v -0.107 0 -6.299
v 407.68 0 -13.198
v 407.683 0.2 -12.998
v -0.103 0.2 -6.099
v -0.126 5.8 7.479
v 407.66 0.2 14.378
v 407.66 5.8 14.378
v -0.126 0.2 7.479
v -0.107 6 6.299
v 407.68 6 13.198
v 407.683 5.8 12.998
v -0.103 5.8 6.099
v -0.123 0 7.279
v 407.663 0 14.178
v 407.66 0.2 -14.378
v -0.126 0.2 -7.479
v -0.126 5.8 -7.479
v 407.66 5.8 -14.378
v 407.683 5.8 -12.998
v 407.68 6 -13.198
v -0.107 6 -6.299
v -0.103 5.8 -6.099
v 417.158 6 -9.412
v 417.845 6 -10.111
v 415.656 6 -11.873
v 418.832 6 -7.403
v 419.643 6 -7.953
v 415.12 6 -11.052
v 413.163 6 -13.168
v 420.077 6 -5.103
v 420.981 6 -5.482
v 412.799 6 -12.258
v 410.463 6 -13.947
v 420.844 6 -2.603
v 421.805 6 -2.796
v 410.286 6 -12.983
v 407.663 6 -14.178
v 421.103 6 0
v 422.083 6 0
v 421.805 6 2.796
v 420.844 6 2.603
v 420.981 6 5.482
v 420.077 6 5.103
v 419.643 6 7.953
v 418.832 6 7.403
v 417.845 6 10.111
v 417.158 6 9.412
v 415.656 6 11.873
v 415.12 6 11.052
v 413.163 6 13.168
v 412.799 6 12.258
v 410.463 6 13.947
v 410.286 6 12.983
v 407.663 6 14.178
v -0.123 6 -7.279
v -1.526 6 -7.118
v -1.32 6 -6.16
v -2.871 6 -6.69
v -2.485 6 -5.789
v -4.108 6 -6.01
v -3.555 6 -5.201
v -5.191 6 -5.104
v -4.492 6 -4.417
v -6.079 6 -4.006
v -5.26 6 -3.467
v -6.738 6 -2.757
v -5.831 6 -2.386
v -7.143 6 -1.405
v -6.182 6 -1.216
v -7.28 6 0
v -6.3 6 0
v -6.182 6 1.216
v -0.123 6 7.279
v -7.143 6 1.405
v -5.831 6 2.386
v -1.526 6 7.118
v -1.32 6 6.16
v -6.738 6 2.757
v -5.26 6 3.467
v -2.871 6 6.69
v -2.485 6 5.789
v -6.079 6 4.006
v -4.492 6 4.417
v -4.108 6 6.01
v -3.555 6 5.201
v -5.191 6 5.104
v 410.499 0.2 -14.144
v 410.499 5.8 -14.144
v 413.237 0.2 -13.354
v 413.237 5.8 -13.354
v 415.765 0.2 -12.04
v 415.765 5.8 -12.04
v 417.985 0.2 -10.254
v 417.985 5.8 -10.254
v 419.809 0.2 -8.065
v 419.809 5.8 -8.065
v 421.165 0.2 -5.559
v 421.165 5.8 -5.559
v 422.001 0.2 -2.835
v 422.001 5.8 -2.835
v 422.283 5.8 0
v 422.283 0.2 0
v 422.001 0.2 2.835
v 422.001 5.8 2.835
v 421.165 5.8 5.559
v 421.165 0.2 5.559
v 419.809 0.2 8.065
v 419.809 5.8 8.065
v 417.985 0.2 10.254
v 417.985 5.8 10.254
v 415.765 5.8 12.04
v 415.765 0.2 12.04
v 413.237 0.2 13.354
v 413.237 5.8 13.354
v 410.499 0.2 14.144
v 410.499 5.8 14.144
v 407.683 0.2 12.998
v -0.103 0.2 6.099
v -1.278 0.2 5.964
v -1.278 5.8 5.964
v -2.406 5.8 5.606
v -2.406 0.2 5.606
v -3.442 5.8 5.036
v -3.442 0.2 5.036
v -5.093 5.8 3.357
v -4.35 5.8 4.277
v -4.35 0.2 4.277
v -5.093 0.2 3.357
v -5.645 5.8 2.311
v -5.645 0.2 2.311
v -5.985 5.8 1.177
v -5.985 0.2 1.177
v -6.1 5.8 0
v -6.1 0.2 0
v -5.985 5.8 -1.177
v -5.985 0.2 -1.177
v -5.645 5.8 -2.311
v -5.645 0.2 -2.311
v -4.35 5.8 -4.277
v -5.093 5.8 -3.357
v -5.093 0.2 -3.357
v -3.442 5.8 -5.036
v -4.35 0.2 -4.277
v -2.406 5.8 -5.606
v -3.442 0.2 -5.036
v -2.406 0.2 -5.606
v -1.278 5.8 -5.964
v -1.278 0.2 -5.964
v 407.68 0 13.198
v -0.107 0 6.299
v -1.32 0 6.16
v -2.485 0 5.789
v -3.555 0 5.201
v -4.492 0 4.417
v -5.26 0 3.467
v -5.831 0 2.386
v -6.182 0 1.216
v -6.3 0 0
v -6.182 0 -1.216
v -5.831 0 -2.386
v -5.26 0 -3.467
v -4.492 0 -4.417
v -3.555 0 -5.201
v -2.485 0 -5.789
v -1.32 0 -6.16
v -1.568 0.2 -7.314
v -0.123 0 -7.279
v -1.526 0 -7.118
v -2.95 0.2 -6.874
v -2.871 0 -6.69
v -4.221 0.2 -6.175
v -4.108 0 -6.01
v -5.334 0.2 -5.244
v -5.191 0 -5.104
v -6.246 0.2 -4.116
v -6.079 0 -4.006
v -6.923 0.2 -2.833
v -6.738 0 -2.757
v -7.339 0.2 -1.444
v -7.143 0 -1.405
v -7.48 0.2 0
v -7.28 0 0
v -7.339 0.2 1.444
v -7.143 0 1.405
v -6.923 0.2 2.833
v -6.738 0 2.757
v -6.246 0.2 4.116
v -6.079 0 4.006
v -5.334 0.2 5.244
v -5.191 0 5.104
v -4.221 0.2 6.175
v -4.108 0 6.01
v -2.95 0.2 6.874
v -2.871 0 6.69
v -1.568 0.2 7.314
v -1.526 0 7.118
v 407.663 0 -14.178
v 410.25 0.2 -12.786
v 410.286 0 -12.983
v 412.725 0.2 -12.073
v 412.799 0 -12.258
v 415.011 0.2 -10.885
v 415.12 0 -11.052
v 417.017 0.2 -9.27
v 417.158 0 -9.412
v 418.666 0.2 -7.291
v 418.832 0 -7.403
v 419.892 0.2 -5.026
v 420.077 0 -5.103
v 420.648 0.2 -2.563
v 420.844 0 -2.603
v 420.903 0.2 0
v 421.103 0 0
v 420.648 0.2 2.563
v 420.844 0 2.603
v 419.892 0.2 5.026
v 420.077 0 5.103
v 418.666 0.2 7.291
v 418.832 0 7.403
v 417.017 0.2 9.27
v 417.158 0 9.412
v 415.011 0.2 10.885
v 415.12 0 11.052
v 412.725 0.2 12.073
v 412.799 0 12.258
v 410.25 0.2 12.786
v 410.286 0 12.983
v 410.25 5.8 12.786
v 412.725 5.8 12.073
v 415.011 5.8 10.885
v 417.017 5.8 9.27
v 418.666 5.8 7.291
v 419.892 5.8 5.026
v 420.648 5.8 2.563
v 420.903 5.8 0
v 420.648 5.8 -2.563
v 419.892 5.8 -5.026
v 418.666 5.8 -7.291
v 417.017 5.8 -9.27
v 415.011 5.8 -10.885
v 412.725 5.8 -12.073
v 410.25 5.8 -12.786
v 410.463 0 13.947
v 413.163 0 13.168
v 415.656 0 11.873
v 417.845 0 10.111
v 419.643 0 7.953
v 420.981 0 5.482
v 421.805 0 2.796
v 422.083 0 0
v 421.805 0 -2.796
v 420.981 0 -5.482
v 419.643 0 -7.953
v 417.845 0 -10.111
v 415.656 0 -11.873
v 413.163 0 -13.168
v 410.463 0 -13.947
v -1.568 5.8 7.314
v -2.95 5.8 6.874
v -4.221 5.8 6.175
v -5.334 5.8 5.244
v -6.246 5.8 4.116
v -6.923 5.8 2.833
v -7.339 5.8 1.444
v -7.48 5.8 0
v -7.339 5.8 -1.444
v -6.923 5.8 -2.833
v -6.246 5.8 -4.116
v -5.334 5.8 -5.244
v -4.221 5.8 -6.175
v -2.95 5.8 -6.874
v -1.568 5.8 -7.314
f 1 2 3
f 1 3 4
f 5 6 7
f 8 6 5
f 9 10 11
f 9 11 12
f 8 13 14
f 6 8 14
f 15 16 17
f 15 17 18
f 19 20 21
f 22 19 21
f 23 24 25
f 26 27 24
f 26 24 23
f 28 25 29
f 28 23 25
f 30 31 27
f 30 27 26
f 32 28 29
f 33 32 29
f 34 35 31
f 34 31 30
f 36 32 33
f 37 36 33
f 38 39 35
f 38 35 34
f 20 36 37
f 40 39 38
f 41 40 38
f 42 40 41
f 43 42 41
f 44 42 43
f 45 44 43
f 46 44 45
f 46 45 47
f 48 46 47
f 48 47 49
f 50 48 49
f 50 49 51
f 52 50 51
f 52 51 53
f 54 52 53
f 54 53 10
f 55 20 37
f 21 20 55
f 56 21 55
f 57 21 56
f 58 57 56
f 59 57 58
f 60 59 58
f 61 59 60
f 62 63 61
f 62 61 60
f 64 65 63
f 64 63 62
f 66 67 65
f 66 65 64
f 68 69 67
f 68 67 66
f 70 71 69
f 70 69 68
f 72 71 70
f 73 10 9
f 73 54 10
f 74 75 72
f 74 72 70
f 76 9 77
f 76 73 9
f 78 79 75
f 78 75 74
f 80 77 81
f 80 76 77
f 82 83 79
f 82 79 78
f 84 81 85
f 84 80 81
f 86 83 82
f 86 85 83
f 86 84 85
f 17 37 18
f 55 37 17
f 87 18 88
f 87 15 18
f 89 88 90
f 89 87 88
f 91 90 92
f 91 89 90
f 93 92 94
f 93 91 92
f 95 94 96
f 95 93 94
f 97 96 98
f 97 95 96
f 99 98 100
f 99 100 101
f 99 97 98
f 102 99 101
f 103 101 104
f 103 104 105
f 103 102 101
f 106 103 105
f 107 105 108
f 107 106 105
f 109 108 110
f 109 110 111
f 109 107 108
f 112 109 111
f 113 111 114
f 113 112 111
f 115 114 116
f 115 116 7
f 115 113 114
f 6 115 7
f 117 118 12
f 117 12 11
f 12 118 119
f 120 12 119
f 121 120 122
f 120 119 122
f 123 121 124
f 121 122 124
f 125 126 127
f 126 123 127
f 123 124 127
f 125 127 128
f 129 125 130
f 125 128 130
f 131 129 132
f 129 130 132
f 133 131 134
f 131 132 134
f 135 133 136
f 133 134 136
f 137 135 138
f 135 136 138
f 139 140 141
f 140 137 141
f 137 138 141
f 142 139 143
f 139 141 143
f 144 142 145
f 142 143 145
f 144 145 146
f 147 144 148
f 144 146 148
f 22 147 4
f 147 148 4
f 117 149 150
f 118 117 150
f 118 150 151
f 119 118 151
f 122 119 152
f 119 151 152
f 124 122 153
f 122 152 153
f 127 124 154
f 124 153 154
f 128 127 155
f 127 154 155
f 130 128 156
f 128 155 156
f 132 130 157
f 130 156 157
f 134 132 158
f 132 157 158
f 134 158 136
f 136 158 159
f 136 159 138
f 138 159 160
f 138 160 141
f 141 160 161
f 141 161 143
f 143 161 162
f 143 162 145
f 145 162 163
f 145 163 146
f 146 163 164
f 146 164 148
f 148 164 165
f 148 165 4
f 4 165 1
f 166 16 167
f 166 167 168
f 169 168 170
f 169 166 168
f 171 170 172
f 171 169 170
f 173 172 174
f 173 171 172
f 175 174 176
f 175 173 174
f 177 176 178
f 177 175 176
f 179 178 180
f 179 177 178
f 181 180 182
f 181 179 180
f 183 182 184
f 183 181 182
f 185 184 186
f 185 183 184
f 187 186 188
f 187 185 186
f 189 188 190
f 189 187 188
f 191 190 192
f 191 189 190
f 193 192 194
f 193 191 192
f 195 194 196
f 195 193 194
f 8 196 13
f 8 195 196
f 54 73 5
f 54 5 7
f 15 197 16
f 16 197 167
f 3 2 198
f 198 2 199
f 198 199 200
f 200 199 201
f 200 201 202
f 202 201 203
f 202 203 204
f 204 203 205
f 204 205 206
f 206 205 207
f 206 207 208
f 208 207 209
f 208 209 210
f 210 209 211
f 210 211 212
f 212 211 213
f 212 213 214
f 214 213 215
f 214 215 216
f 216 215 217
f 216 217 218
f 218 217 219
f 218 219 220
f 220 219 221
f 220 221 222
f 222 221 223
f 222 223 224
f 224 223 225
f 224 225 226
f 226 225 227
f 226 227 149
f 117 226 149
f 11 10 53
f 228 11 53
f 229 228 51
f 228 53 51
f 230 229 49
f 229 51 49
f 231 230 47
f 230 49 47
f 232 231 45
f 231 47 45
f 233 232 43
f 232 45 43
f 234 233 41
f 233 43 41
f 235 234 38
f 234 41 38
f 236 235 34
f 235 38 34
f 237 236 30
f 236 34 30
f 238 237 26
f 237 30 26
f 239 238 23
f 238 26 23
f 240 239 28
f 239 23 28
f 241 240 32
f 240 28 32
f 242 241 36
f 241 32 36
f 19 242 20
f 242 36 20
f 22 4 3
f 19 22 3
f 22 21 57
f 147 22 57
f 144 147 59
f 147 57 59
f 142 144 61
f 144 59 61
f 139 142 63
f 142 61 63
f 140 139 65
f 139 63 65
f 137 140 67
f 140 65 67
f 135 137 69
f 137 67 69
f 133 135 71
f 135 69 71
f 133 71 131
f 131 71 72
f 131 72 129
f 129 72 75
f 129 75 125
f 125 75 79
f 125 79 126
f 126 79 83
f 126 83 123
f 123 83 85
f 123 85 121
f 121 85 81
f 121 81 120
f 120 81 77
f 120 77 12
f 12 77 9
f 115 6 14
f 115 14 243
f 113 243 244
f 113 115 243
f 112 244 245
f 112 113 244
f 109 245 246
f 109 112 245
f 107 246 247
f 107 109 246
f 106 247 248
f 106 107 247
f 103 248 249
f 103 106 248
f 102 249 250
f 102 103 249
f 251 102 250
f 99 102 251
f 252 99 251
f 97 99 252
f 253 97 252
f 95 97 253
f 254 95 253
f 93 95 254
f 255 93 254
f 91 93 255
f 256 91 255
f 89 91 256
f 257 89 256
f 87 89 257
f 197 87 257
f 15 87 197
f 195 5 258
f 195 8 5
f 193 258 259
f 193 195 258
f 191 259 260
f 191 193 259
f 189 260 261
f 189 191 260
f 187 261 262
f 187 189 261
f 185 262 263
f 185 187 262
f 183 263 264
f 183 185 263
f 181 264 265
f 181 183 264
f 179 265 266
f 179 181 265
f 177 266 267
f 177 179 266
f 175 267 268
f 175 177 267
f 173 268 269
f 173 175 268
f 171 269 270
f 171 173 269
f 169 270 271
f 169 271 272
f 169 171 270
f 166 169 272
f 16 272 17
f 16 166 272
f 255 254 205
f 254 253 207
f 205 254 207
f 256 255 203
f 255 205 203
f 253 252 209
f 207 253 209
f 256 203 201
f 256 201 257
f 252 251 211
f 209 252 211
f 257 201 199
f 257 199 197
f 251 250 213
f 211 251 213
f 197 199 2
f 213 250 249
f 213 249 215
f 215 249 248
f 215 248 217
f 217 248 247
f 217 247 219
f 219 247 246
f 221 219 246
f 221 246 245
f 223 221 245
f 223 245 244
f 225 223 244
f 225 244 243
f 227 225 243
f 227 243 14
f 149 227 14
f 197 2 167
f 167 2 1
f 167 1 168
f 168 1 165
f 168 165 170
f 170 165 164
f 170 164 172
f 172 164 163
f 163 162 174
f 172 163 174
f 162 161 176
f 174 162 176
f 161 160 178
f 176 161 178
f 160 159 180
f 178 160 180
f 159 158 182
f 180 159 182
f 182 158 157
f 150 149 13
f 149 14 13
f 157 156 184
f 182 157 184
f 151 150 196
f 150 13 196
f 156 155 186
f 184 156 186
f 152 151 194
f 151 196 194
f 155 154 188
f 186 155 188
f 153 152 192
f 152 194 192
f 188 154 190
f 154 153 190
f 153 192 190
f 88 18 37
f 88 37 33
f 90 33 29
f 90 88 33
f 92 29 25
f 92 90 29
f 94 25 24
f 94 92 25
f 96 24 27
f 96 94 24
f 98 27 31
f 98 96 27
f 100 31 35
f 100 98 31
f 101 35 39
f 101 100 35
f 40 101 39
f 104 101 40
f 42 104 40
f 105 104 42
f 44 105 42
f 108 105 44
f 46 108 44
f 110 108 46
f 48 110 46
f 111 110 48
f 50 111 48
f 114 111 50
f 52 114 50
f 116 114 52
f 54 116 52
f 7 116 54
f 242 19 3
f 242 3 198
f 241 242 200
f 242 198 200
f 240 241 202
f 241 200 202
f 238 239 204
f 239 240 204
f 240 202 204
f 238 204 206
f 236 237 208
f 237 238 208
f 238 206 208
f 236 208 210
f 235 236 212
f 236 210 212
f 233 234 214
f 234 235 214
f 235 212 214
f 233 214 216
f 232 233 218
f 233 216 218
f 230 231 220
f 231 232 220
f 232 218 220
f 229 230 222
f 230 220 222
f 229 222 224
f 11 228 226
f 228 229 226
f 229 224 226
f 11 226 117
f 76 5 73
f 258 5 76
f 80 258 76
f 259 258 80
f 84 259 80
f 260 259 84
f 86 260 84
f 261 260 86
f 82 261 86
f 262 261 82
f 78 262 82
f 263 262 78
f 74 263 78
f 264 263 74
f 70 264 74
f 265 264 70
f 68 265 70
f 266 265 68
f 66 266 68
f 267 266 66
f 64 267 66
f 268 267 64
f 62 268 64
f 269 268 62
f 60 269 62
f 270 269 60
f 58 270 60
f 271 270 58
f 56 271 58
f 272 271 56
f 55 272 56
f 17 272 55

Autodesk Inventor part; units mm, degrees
ref_plane "YZ Plane" through (0, 0, 0) normal (1, 0, 0) x (0, 1, 0)
ref_plane "XZ Plane" through (0, 0, 0) normal (0, 1, 0) x (-1, 0, 0)
ref_plane "XY Plane" through (0, 0, 0) normal (0, 0, 1) x (1, 0, 0)
sketch "Sketch1" plane through (0, 0, 0) normal (0, 1, 0) x (-1, 0, 0)
  line L0 (0.1032, -6.0991) -> (-407.6831, -12.9981)
  line L1 (0.1032, 6.0991) -> (-407.6831, 12.9981)
  arc A0 (0.1032, -6.0991) -> (0.1032, 6.0991) centre (0, 0) ccw
  arc A1 (-407.6831, 12.9981) -> (-407.6831, -12.9981) centre (-407.903, 0) ccw
  line L2 (-407.6598, 14.3779) -> (0.1265, 7.4789)
  arc A2 (0.1265, -7.4789) -> (0.1265, 7.4789) centre (0, 0) ccw
  line L3 (0.1265, -7.4789) -> (-407.6598, -14.3779)
  arc A3 (-407.6598, 14.3779) -> (-407.6598, -14.3779) centre (-407.903, 0) ccw
  dimension "d2" = 6.1
  dimension "d3" = 13
  dimension "d4" = 1.38
  dimension "d5" = 407.903
extrude "Extrusion1" add sketch "Sketch1" along normal blind 6
chamfer "Chamfer1" distance 0.2 angle 45 16 edges at (203.79, 6, 9.5486) (-6.1, 6, 0) (203.79, 6, -9.5486) (420.903, 6, 0) (203.7666, 6, 10.9284) (422.283, 6, 0) (203.7666, 6, -10.9284) (-7.48, 6, 0) (203.7666, 0, 10.9284) (-7.48, 0, 0) (203.7666, 0, -10.9284) (422.283, 0, 0) (203.79, 0, 9.5486) (420.903, 0, 0) (203.79, 0, -9.5486) (-6.1, 0, 0)
properties part number "y_axis_belt" material "Rubber"
